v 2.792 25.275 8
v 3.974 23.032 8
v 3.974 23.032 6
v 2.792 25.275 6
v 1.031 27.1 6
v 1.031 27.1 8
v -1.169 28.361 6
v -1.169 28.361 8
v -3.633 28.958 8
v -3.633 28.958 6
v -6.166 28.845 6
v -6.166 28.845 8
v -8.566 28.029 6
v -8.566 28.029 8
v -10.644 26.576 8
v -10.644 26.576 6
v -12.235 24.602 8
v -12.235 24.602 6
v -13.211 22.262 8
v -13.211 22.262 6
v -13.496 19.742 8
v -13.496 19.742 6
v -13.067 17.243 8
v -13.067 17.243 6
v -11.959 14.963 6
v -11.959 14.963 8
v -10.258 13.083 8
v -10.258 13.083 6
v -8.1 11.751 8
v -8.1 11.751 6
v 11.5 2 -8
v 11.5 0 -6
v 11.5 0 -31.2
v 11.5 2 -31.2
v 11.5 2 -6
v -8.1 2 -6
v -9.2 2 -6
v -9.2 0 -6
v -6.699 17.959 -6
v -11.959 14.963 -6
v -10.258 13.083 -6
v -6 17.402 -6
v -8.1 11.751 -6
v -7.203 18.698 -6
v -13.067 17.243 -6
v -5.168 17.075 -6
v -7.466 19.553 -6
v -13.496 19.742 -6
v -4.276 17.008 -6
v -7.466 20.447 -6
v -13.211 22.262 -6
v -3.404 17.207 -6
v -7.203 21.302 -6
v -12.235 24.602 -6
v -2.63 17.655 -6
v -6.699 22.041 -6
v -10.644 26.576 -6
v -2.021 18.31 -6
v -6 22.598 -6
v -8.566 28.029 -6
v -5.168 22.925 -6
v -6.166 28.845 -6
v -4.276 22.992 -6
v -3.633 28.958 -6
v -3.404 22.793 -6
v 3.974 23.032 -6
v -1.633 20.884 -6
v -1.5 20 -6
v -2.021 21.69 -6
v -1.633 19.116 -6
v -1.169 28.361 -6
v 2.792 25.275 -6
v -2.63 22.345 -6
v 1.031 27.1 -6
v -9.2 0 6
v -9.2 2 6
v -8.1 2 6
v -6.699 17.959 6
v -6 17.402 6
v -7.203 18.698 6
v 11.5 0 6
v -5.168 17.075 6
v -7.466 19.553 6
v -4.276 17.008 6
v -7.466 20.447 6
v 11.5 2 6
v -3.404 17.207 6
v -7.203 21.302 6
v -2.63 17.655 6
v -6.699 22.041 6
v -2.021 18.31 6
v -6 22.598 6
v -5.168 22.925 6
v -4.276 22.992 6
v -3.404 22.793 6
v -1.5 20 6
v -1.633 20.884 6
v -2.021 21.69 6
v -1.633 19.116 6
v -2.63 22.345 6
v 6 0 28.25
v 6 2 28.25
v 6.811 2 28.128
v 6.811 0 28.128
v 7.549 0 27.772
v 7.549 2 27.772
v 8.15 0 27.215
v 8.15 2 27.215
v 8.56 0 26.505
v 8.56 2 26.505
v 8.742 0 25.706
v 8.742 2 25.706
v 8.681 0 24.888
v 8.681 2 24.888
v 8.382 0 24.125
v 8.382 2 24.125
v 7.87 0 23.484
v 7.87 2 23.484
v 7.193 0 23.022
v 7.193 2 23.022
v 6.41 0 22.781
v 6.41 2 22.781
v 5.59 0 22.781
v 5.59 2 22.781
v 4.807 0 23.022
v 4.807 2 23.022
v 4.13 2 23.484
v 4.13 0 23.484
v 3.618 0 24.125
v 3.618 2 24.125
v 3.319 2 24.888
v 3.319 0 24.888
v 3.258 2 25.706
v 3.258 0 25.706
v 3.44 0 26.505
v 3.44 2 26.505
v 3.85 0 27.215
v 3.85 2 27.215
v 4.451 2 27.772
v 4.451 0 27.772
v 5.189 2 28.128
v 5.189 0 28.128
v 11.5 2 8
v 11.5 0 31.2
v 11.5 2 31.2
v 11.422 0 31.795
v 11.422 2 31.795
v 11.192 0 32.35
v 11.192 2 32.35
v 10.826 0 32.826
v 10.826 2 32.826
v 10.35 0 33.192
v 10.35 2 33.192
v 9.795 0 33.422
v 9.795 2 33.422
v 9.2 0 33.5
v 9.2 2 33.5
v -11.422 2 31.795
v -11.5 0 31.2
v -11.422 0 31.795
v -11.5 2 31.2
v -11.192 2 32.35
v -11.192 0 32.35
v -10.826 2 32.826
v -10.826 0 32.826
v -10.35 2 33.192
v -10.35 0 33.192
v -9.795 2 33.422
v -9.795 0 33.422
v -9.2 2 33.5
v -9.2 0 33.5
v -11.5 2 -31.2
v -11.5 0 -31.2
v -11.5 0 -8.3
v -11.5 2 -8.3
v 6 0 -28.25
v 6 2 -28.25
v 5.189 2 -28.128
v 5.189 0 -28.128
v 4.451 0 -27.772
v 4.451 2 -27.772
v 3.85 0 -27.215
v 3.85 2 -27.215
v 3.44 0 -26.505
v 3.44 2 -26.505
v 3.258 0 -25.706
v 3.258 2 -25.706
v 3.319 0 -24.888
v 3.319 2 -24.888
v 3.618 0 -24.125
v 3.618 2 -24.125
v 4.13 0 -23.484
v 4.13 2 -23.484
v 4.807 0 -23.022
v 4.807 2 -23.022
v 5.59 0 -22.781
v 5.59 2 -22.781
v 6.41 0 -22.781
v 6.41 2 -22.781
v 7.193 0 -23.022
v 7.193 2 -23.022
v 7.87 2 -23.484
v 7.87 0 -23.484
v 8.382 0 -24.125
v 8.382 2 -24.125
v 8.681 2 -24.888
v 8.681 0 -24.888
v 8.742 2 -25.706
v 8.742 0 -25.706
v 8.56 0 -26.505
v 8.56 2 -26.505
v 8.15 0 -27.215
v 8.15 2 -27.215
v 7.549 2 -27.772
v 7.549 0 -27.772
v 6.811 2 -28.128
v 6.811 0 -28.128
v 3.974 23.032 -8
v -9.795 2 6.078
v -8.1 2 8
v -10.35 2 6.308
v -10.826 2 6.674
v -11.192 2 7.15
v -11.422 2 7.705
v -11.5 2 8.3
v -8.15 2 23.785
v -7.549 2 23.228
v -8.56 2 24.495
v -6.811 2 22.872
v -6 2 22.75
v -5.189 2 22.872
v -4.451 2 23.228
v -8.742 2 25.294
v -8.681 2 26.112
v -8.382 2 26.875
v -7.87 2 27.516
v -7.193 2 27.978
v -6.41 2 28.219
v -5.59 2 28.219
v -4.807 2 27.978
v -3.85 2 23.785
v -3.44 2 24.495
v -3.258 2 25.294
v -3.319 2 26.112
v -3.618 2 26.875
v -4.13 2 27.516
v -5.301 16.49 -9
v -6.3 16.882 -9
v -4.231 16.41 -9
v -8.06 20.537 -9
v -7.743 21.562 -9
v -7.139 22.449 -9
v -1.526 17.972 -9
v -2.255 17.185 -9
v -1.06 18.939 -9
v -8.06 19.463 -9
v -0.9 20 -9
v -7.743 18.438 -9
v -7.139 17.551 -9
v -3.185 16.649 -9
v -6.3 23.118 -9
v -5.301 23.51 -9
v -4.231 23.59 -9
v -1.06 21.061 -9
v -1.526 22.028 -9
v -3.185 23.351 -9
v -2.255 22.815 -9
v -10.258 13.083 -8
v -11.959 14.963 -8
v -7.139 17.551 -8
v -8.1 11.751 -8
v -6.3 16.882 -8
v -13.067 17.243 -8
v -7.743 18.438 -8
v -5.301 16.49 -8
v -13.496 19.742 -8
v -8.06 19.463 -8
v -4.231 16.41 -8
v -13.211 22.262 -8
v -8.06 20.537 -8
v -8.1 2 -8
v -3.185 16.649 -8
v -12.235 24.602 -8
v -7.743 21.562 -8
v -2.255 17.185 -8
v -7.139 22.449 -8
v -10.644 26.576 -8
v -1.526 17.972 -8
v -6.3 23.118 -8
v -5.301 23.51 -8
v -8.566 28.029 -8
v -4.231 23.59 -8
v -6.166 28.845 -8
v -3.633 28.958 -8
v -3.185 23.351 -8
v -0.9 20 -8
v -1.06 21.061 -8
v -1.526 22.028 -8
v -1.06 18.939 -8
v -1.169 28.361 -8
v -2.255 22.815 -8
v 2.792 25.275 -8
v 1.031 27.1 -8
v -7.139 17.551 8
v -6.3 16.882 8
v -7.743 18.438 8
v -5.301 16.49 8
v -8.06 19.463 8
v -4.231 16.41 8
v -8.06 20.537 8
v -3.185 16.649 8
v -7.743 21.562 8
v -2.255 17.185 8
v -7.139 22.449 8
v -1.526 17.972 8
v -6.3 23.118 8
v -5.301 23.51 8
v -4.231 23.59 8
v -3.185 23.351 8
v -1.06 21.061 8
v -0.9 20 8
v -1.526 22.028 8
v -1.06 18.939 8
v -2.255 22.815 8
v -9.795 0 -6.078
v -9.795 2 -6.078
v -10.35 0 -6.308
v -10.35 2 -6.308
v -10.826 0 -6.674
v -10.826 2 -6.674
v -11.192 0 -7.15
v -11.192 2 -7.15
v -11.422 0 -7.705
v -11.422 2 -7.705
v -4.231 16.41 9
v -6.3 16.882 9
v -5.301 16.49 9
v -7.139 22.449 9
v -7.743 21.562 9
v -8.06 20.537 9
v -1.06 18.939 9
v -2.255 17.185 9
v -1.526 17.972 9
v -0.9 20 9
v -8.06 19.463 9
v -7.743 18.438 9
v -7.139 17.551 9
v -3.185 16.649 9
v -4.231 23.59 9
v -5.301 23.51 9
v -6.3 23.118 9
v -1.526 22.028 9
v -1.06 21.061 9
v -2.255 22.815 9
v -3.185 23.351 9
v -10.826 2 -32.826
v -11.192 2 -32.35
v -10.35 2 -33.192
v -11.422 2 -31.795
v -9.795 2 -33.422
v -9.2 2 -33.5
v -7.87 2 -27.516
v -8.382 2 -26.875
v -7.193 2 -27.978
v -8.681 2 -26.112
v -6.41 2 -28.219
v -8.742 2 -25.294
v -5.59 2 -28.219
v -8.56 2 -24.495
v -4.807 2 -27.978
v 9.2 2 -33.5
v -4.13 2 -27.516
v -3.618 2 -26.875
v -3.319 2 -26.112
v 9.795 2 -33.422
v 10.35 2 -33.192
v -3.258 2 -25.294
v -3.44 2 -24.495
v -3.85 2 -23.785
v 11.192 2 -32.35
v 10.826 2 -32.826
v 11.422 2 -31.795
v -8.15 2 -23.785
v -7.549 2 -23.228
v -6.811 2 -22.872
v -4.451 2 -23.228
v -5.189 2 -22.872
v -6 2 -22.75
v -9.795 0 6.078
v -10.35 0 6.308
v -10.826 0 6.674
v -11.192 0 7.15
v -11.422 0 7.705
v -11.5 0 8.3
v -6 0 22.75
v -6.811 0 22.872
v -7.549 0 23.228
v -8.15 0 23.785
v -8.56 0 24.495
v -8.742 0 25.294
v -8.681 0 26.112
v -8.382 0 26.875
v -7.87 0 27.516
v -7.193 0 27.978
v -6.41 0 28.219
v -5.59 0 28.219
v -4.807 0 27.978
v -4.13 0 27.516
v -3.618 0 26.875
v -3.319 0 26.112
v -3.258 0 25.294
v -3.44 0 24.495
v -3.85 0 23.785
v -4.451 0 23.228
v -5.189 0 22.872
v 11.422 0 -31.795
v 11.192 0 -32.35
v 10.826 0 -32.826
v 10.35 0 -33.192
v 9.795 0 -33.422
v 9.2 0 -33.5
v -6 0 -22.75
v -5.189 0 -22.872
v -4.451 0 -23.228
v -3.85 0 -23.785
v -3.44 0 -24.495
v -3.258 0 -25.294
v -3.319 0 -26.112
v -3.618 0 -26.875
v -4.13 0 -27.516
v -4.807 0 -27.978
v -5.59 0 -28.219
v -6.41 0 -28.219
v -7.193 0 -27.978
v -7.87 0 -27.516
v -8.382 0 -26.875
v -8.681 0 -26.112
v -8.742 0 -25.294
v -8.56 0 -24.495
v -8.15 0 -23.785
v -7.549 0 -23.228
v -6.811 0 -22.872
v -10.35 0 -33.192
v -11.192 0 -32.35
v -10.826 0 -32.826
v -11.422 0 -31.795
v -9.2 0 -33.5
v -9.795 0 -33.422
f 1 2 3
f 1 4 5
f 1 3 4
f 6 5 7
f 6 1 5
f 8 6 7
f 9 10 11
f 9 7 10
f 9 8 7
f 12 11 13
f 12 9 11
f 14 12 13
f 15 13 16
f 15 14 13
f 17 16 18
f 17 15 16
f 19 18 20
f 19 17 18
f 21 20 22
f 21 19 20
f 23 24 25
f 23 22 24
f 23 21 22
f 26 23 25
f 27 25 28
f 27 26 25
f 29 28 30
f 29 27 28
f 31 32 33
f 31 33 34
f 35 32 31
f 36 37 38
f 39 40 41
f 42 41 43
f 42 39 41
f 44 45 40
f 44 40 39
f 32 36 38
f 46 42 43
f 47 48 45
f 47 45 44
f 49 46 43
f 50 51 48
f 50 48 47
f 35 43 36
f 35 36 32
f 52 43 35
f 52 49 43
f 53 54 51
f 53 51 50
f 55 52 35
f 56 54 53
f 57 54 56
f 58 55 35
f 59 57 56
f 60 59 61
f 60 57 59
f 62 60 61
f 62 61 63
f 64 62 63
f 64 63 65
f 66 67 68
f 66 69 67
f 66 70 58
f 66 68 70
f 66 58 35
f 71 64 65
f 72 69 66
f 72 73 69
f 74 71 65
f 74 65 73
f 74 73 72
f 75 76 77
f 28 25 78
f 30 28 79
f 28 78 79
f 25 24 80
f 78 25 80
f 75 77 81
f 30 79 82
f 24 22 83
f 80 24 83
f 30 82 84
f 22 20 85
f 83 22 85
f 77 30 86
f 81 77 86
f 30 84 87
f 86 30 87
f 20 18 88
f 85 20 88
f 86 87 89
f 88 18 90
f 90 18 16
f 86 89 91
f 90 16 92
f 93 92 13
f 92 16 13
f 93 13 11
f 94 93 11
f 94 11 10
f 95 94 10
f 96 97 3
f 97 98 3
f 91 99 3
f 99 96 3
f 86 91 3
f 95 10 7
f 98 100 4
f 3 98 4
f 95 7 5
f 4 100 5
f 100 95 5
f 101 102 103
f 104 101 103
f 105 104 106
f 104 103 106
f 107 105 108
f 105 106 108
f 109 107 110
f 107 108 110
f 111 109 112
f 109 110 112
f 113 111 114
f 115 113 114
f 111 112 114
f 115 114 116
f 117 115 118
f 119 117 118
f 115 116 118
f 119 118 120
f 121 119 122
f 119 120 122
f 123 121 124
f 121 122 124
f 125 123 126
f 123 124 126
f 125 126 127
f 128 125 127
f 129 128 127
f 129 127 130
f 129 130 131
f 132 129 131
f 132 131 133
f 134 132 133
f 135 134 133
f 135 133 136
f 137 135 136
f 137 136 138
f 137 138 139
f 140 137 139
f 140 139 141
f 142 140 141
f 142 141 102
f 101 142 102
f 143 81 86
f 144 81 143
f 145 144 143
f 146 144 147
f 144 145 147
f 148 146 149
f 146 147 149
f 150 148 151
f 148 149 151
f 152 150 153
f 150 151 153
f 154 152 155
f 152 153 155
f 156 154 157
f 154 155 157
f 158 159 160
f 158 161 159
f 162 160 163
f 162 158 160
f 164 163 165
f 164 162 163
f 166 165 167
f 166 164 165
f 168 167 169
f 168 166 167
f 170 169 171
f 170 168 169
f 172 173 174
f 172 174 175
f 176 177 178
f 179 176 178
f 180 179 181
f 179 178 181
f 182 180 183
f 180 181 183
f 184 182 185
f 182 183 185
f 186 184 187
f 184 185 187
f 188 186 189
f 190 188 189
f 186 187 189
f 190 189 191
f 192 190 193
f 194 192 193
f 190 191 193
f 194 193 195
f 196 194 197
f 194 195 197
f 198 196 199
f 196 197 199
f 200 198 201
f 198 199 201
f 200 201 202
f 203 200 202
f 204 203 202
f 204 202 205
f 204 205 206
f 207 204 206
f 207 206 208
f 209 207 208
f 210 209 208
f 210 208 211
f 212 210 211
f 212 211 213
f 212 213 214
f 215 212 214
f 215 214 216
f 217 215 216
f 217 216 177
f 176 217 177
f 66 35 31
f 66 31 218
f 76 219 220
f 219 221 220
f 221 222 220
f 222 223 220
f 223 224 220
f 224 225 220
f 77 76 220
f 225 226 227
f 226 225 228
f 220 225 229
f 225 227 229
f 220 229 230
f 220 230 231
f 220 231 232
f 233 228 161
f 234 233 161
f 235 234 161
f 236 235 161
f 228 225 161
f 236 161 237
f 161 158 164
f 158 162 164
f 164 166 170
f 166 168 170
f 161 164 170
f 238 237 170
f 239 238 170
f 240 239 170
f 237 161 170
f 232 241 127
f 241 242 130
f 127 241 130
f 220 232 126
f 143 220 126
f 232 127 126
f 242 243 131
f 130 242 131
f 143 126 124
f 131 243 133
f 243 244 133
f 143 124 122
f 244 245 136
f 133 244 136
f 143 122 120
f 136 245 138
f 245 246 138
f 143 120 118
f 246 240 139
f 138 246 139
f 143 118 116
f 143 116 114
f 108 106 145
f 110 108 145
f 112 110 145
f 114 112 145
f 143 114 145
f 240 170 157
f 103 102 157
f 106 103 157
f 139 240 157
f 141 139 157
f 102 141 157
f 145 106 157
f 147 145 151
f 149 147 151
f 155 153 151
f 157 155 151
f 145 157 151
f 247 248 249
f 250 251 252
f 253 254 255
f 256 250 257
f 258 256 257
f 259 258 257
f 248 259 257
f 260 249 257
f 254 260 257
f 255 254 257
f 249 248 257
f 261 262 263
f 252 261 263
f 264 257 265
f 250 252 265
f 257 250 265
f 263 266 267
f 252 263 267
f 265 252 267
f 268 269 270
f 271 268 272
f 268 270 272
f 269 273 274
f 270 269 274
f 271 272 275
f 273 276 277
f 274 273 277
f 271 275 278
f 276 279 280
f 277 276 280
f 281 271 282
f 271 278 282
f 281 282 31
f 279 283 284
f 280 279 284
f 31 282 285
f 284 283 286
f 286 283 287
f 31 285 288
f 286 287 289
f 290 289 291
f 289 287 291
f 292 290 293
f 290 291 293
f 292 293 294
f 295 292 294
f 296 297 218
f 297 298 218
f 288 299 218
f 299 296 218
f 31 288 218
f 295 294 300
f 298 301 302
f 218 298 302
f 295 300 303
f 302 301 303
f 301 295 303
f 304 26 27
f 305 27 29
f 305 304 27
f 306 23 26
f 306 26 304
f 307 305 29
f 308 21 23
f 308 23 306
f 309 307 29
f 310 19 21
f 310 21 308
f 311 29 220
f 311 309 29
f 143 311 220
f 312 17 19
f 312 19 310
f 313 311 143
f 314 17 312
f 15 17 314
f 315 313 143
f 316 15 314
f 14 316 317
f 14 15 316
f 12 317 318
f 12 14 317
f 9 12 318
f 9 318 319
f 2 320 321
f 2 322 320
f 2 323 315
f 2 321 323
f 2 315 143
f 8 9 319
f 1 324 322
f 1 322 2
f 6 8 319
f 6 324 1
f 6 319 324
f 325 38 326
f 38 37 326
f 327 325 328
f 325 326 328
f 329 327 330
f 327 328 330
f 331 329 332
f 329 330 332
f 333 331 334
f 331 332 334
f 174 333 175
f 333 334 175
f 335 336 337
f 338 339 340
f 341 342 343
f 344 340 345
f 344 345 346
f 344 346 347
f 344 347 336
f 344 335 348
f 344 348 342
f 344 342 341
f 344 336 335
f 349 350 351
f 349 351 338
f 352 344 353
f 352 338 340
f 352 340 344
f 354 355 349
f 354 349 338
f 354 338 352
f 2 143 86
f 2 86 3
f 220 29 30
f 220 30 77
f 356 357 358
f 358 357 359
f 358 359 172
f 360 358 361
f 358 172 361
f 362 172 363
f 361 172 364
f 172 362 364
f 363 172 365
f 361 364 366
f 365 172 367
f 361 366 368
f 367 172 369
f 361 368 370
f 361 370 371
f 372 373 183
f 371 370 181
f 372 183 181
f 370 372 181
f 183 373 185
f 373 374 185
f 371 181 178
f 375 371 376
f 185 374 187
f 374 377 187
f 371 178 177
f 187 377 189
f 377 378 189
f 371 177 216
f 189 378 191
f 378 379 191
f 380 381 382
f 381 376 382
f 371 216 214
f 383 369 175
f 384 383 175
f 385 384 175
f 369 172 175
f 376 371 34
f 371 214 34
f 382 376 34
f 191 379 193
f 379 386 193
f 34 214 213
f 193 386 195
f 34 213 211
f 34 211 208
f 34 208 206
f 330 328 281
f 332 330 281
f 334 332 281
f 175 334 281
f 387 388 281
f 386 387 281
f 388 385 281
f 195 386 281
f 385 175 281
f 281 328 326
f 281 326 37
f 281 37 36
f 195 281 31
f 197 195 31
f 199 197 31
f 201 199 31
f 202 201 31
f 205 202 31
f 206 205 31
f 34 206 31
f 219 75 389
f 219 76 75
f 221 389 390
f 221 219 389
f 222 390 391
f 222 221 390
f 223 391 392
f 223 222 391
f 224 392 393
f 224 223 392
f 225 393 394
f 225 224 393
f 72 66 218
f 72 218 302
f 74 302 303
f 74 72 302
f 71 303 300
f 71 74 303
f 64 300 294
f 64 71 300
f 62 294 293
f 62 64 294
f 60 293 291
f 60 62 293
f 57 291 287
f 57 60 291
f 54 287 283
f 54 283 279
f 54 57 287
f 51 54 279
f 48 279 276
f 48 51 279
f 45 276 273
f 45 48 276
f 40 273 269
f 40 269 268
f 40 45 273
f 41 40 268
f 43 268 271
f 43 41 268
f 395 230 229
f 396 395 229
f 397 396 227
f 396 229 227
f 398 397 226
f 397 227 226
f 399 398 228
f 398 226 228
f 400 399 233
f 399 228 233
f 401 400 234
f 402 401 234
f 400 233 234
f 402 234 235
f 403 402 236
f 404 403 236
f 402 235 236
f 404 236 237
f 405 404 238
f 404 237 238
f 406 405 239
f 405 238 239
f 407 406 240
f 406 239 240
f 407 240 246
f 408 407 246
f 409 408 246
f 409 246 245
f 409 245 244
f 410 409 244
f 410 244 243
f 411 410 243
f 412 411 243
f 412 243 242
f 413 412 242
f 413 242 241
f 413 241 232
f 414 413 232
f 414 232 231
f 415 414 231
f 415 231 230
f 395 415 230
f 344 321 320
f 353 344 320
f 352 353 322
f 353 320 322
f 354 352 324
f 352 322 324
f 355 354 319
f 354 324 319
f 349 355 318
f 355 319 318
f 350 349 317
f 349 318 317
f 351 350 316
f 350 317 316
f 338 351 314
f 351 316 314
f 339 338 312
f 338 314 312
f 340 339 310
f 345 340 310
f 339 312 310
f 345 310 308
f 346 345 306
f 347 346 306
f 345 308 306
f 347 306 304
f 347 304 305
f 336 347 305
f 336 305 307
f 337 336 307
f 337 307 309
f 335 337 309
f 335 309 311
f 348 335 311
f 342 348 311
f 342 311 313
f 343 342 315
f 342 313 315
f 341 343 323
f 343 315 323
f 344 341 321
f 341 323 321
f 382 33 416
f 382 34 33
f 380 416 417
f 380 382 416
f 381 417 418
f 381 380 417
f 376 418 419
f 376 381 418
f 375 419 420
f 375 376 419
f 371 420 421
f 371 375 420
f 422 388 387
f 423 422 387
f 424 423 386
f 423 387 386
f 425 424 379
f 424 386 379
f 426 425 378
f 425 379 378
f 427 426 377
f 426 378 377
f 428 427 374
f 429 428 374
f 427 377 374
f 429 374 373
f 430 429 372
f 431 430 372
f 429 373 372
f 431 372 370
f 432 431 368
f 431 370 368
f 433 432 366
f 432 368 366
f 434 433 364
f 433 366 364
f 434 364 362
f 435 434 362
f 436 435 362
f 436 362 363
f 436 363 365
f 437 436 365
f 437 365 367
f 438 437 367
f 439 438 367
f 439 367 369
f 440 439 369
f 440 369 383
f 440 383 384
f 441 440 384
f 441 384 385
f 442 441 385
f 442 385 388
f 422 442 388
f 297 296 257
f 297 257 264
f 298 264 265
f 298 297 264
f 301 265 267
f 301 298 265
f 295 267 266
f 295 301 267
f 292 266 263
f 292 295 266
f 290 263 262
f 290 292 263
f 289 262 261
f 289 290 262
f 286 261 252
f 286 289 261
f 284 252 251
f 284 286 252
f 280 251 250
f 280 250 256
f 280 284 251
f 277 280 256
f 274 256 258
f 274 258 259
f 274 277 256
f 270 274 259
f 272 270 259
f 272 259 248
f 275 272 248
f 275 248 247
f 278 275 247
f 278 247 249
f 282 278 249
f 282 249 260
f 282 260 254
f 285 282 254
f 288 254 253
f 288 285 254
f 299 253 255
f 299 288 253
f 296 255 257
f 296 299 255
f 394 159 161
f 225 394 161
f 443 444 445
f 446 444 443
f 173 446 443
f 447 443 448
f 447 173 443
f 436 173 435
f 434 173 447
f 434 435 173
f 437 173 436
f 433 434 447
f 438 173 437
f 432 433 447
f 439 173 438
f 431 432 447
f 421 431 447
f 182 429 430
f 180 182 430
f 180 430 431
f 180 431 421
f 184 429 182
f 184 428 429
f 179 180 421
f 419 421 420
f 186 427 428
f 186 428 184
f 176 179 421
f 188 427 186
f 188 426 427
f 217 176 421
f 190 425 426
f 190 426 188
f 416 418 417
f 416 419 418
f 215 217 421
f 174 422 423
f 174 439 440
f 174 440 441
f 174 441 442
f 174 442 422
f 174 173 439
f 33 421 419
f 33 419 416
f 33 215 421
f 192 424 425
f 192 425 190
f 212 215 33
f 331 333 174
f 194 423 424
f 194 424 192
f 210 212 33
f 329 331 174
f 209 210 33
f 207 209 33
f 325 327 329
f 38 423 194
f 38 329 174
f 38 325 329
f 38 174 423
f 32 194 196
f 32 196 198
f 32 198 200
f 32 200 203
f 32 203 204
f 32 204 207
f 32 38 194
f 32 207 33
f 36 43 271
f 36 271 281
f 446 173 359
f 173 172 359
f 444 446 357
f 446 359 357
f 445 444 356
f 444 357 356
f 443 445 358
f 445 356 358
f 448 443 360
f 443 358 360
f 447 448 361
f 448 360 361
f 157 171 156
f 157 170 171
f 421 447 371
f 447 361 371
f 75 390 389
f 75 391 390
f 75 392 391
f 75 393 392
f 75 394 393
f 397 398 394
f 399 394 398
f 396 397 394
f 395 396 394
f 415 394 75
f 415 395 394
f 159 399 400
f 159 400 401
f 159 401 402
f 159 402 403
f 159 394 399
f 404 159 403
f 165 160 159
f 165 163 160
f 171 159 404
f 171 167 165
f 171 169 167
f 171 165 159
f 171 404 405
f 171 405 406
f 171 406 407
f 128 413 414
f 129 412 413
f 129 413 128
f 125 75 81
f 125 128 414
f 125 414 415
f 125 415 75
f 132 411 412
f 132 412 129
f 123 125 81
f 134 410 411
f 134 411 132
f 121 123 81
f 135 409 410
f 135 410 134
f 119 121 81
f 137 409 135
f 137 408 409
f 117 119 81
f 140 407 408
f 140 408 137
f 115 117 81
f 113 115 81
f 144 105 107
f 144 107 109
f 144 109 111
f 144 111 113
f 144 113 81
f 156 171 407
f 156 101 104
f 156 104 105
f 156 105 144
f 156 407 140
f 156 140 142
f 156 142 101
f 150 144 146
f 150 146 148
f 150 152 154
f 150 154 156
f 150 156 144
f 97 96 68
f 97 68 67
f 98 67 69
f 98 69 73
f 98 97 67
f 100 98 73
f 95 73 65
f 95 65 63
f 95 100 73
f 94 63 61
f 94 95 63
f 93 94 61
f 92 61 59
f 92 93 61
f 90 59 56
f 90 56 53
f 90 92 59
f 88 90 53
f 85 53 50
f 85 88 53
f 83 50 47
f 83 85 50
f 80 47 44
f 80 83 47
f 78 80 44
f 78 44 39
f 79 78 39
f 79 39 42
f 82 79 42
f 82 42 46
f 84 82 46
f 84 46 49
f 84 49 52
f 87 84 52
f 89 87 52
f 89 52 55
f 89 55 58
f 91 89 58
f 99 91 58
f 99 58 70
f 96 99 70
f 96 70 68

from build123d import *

# Parameters (mm, degrees)
EXTRUDE_START       = 33.5
SKETCH_3_W          = 23
SKETCH_3_H          = 2
EXTRUDE_1_DEPTH     = 67
EXTRUDE_START_2     = 8
SKETCH_4_R          = 3
EXTRUDE_2_DEPTH     = 2
EXTRUDE_START_3     = -6
SKETCH_5_R          = 3
EXTRUDE_3_DEPTH     = 2
SKETCH_6_R          = 3.6
EXTRUDE_4_DEPTH     = 1
EXTRUDE_START_4     = 16
SKETCH_7_R          = 3
EXTRUDE_5_DEPTH     = 16
SKETCH_8_W          = 12
SKETCH_8_H          = 12.516134774
CUT_EXTRUDE_1_DEPTH = 23
SKETCH_9_R          = 2.75
CUT_EXTRUDE_2_DEPTH = 46.094345544
FILLET_3_R          = 2.3


with BuildPart() as part:
    # 草图3 → 凸台-拉伸1 (new body)
    with BuildSketch(Plane.XY.offset(EXTRUDE_START)):
        with Locations((0, 1)):
            Rectangle(SKETCH_3_W, SKETCH_3_H)
    extrude(amount=-EXTRUDE_1_DEPTH)

    # 草图4 → 凸台-拉伸2 (add)
    with BuildSketch(Plane.XY.offset(EXTRUDE_START_2)):
        with BuildLine():
            Line((-8.1, 11.751363749), (-8.1, 0))
            Line((-8.1, 0), (11.5, 0))
            Line((11.5, 0), (11.5, 2))
            Line((11.5, 2), (3.973803242, 23.032269549))
            ThreePointArc((3.973803242, 23.032269549), (-10.644363142, 26.576230043), (-8.1, 11.751363749))
        make_face()
        with Locations((-4.5, 20)):
            Circle(SKETCH_4_R, mode=Mode.SUBTRACT)
    extrude(amount=-EXTRUDE_2_DEPTH)

    # 草图5 → 凸台-拉伸3 (add)
    with BuildSketch(Plane.XY.offset(EXTRUDE_START_3)):
        with BuildLine():
            Line((-8.1, 11.751363749), (-8.1, 0))
            Line((-8.1, 0), (11.5, 0))
            Line((11.5, 0), (11.5, 2))
            Line((11.5, 2), (3.973803242, 23.032269549))
            ThreePointArc((3.973803242, 23.032269549), (-10.644363142, 26.576230043), (-8.1, 11.751363749))
        make_face()
        with Locations((-4.5, 20)):
            Circle(SKETCH_5_R, mode=Mode.SUBTRACT)
    extrude(amount=-EXTRUDE_3_DEPTH)

    # 草图6 → 凸台-拉伸4 (add)
    with BuildSketch(Plane.XY.offset(8)):
        with Locations((-4.5, 20)):
            Circle(SKETCH_6_R)
    extrude_4 = extrude(amount=EXTRUDE_4_DEPTH)

    # 镜向2: 凸台-拉伸4 across plane
    add(extrude_4.mirror(Plane.XY))

    # 草图7 → 凸台-拉伸5 (add)
    with BuildSketch(Plane.XY.offset(-8).offset(EXTRUDE_START_4)):
        with Locations((-4.5, 20)):
            Circle(SKETCH_7_R)
    extrude(amount=-EXTRUDE_5_DEPTH)

    # 草图8 → 切除-拉伸1 (cut)
    with BuildSketch(Plane(origin=(11.5, 0, 0), x_dir=(0, 0, -1), z_dir=(1, 0, 0))):
        with Locations((0, 6.258067387)):
            Rectangle(SKETCH_8_W, SKETCH_8_H)
    extrude(amount=-CUT_EXTRUDE_1_DEPTH, mode=Mode.SUBTRACT)

    # 草图9 → 切除-拉伸2 (cut, through all)
    with BuildSketch(Plane(origin=(0, 2, 0), x_dir=(1, 0, 0), z_dir=(0, 1, 0))):
        with Locations(Location((-6, 25.5, 0), (0, 0, 270))):
            Circle(SKETCH_9_R)
        with Locations(Location((6, 25.5, 0), (0, 0, 90))):
            Circle(SKETCH_9_R)
        with Locations(Location((6, -25.5, 0), (0, 0, 270))):
            Circle(SKETCH_9_R)
        with Locations(Location((-6, -25.5, 0), (0, 0, 90))):
            Circle(SKETCH_9_R)
    extrude(amount=-CUT_EXTRUDE_2_DEPTH, mode=Mode.SUBTRACT)

    # 圆角3
    fillet_3_edges = [part.edges().sort_by_distance(p)[0] for p in [
        (-11.5, 1, -33.5),
        (-11.5, 1, 33.5),
        (11.5, 1, 33.5),
        (11.5, 1, -33.5),
        (-11.5, 1, -6),
        (-11.5, 1, 6),
    ]]
    fillet(fillet_3_edges, radius=FILLET_3_R)


solid = part.part
